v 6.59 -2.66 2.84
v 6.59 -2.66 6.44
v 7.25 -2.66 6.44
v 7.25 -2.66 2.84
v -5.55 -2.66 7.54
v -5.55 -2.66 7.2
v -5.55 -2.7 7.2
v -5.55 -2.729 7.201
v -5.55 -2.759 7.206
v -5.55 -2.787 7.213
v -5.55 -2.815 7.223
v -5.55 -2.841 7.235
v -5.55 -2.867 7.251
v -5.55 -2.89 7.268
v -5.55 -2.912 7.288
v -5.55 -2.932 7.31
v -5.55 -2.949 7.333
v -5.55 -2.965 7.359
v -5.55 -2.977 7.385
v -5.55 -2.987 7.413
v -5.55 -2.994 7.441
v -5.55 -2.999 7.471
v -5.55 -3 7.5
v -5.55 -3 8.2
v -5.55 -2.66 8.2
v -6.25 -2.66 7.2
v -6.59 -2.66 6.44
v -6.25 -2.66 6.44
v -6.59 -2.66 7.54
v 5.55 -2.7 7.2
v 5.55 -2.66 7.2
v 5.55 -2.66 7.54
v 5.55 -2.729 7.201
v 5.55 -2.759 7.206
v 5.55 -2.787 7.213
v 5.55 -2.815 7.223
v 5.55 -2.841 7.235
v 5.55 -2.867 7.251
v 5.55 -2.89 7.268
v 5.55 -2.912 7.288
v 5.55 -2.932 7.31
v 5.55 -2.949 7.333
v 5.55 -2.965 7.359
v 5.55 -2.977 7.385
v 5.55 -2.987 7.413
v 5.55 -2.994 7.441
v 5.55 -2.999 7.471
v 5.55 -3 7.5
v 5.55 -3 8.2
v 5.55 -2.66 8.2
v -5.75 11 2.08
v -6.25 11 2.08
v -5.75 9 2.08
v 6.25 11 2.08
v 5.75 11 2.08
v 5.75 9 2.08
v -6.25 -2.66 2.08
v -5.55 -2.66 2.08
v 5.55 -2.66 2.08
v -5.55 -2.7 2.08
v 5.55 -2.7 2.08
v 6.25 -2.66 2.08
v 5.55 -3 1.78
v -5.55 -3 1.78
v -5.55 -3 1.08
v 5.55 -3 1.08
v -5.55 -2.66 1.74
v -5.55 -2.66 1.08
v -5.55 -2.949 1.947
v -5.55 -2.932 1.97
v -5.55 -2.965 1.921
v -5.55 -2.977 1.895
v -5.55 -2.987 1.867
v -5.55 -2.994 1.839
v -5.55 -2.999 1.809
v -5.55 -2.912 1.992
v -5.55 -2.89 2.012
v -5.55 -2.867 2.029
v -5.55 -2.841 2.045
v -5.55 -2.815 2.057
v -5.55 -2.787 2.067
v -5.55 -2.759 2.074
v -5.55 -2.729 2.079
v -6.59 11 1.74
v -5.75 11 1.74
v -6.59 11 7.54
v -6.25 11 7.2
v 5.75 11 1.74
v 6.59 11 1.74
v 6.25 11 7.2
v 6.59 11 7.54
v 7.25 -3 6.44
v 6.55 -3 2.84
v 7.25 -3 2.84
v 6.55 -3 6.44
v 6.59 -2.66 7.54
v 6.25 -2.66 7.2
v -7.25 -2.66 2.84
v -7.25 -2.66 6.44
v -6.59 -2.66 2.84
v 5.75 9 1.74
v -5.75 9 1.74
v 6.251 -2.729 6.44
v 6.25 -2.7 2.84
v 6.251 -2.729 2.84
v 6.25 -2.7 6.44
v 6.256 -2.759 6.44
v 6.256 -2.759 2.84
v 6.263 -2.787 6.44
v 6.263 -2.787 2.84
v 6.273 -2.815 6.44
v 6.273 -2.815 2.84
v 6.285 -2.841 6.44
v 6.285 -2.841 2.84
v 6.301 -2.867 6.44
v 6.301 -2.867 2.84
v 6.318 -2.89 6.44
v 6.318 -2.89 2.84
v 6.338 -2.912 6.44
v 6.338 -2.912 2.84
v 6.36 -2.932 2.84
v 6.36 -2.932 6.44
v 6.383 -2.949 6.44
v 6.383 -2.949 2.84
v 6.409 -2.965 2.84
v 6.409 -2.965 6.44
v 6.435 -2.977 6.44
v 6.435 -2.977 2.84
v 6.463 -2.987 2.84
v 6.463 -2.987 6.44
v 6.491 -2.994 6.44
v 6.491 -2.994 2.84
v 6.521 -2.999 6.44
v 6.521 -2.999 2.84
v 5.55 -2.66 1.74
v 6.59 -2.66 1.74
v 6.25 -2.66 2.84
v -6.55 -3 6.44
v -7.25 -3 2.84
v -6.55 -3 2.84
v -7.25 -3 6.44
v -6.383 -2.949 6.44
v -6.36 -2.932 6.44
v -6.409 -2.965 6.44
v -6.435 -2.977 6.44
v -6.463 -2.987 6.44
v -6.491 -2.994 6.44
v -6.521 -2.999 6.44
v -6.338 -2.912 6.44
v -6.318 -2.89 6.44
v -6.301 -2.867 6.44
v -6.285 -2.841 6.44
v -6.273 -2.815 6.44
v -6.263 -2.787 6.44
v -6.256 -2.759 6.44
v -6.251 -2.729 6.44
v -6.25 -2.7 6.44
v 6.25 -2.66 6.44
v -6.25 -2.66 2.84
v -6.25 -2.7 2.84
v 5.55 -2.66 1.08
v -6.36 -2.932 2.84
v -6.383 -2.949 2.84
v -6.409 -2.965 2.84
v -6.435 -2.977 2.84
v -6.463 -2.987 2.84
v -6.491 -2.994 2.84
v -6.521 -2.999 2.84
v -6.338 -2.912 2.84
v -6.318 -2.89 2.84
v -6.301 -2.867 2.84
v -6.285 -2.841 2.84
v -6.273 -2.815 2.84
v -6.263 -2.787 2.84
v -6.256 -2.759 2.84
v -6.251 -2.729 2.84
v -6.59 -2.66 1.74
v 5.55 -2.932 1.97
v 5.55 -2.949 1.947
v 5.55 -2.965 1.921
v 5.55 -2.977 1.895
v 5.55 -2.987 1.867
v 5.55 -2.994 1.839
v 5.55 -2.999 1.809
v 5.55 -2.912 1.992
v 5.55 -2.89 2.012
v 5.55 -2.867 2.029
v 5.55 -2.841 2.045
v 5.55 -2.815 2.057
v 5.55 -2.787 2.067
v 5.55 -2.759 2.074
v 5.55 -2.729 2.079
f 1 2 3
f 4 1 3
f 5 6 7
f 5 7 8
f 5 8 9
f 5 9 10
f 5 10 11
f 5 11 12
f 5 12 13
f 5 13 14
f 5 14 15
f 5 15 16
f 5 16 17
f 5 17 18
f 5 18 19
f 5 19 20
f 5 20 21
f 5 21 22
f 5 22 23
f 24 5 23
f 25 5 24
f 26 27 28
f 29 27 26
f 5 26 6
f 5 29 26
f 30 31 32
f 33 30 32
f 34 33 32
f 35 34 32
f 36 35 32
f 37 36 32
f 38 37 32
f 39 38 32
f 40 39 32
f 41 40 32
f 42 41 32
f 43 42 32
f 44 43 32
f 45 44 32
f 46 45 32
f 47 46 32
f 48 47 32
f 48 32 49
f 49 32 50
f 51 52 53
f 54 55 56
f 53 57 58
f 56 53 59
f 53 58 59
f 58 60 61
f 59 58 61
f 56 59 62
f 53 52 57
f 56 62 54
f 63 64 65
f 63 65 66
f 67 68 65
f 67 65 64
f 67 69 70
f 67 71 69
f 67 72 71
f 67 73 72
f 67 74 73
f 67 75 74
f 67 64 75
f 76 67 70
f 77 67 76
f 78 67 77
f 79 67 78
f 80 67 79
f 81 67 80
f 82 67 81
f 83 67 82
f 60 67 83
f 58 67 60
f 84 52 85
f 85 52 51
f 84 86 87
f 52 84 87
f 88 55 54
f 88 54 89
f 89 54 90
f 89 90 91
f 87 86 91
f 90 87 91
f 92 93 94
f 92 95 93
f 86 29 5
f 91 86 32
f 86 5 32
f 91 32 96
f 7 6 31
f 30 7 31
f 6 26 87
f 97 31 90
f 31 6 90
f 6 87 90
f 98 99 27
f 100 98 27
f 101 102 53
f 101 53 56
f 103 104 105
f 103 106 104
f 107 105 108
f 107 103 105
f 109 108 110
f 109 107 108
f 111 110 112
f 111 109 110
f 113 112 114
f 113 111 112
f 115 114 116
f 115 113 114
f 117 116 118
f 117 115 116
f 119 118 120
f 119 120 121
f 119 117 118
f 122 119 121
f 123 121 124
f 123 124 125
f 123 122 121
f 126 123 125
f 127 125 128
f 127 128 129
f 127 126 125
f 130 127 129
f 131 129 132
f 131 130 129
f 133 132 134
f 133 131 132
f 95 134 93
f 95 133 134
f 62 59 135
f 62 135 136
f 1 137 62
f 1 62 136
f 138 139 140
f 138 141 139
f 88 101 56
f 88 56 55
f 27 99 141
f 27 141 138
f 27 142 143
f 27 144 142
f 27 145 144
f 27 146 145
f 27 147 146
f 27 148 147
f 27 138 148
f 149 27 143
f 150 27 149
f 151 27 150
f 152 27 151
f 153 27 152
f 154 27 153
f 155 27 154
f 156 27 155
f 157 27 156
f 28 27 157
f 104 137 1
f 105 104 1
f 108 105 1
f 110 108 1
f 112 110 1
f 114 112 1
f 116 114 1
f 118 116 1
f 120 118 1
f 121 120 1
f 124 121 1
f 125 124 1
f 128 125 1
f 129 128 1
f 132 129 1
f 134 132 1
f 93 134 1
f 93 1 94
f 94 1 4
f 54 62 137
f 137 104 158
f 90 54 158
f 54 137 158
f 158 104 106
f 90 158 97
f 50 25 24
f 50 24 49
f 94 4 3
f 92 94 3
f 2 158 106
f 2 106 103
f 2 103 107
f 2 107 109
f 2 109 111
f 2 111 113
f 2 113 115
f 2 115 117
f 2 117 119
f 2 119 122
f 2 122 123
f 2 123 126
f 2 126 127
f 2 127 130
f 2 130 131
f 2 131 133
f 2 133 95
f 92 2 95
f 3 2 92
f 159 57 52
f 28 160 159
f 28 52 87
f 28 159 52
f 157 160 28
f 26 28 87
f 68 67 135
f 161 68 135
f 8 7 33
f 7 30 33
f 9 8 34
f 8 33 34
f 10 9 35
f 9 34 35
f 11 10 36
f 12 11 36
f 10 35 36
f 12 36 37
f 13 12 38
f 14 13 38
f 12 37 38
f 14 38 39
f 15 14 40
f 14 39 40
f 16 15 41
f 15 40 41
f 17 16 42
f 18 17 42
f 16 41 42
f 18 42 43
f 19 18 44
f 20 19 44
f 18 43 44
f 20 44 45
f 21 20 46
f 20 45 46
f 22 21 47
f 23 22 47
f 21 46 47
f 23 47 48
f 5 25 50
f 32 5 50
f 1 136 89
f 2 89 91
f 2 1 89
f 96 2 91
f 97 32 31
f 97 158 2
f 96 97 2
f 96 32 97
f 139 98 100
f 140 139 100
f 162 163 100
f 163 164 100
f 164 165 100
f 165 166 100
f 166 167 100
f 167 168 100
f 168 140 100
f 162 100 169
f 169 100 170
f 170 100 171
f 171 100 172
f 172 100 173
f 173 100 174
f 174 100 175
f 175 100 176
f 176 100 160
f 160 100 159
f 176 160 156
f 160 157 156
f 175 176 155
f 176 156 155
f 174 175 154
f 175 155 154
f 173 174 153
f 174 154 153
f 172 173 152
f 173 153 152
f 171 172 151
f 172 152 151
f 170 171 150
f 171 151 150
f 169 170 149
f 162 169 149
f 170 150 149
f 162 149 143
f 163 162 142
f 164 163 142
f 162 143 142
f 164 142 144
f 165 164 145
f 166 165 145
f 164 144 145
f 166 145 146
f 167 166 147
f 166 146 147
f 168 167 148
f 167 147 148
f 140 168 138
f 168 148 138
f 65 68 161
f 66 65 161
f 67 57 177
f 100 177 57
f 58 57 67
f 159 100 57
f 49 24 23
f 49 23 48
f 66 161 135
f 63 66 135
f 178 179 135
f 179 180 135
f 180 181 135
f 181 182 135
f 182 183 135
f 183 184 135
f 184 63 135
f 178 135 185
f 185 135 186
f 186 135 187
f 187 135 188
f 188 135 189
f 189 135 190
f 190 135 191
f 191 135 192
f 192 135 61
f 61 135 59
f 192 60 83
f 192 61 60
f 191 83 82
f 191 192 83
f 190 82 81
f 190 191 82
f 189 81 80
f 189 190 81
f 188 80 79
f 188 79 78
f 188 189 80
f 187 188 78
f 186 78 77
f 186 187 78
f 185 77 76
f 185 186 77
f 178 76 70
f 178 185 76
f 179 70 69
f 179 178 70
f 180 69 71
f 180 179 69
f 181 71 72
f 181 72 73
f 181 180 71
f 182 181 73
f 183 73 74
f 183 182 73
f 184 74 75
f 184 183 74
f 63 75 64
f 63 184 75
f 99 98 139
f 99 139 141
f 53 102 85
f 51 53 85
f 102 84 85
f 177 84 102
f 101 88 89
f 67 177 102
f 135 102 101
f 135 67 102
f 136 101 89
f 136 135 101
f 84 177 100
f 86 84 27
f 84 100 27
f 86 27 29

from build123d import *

# Parameters (mm, degrees)
SKETCH009_W       = 13.18
SKETCH009_H       = 5.8
SKETCH009_W_2     = 12.5
SKETCH009_H_2     = 5.12
PAD005_DEPTH      = 2.66
PAD005_DEPTH_BACK = 11
SKETCH011_W       = 11.1
SKETCH011_H       = 1
SKETCH011_W_2     = 1
SKETCH011_H_2     = 3.6
PAD006_DEPTH      = 0.34
SKETCH012_W       = 11.5
SKETCH012_H       = 2
POCKET004_DEPTH   = 5
FILLET001_R       = 0.3


with BuildPart() as part:
    # Sketch009 → Pad005 (new body, two sides)
    with BuildSketch(Plane.XZ) as pad005_sk:
        with Locations((0, 4.64)):
            Rectangle(SKETCH009_W, SKETCH009_H)
        with Locations((0, 4.64)):
            Rectangle(SKETCH009_W_2, SKETCH009_H_2, mode=Mode.SUBTRACT)
    extrude(amount=PAD005_DEPTH)
    extrude(pad005_sk.sketch, amount=-PAD005_DEPTH_BACK)

    # Sketch011 → Pad006 (join)
    with BuildSketch(Plane.XZ.offset(2.66)):
        with Locations((0, 7.7)):
            Rectangle(SKETCH011_W, SKETCH011_H)
        with Locations((0, 1.58)):
            Rectangle(SKETCH011_W, SKETCH011_H)
        with Locations((-6.75, 4.64)):
            Rectangle(SKETCH011_W_2, SKETCH011_H_2)
        with Locations((6.75, 4.64)):
            Rectangle(SKETCH011_W_2, SKETCH011_H_2)
    extrude(amount=PAD006_DEPTH)

    # Sketch012 → Pocket004 (cut)
    with BuildSketch(Plane.XY):
        with Locations((0, 10)):
            Rectangle(SKETCH012_W, SKETCH012_H)
    extrude(amount=POCKET004_DEPTH, mode=Mode.SUBTRACT)

    # Fillet001
    fillet001_edges = [part.edges().sort_by_distance(p)[0] for p in [
        (-6.25, -3, 4.64),
        (0, -3, 7.2),
        (6.25, -3, 4.64),
        (0, -3, 2.08),
    ]]
    fillet(fillet001_edges, radius=FILLET001_R)


solid = part.part
